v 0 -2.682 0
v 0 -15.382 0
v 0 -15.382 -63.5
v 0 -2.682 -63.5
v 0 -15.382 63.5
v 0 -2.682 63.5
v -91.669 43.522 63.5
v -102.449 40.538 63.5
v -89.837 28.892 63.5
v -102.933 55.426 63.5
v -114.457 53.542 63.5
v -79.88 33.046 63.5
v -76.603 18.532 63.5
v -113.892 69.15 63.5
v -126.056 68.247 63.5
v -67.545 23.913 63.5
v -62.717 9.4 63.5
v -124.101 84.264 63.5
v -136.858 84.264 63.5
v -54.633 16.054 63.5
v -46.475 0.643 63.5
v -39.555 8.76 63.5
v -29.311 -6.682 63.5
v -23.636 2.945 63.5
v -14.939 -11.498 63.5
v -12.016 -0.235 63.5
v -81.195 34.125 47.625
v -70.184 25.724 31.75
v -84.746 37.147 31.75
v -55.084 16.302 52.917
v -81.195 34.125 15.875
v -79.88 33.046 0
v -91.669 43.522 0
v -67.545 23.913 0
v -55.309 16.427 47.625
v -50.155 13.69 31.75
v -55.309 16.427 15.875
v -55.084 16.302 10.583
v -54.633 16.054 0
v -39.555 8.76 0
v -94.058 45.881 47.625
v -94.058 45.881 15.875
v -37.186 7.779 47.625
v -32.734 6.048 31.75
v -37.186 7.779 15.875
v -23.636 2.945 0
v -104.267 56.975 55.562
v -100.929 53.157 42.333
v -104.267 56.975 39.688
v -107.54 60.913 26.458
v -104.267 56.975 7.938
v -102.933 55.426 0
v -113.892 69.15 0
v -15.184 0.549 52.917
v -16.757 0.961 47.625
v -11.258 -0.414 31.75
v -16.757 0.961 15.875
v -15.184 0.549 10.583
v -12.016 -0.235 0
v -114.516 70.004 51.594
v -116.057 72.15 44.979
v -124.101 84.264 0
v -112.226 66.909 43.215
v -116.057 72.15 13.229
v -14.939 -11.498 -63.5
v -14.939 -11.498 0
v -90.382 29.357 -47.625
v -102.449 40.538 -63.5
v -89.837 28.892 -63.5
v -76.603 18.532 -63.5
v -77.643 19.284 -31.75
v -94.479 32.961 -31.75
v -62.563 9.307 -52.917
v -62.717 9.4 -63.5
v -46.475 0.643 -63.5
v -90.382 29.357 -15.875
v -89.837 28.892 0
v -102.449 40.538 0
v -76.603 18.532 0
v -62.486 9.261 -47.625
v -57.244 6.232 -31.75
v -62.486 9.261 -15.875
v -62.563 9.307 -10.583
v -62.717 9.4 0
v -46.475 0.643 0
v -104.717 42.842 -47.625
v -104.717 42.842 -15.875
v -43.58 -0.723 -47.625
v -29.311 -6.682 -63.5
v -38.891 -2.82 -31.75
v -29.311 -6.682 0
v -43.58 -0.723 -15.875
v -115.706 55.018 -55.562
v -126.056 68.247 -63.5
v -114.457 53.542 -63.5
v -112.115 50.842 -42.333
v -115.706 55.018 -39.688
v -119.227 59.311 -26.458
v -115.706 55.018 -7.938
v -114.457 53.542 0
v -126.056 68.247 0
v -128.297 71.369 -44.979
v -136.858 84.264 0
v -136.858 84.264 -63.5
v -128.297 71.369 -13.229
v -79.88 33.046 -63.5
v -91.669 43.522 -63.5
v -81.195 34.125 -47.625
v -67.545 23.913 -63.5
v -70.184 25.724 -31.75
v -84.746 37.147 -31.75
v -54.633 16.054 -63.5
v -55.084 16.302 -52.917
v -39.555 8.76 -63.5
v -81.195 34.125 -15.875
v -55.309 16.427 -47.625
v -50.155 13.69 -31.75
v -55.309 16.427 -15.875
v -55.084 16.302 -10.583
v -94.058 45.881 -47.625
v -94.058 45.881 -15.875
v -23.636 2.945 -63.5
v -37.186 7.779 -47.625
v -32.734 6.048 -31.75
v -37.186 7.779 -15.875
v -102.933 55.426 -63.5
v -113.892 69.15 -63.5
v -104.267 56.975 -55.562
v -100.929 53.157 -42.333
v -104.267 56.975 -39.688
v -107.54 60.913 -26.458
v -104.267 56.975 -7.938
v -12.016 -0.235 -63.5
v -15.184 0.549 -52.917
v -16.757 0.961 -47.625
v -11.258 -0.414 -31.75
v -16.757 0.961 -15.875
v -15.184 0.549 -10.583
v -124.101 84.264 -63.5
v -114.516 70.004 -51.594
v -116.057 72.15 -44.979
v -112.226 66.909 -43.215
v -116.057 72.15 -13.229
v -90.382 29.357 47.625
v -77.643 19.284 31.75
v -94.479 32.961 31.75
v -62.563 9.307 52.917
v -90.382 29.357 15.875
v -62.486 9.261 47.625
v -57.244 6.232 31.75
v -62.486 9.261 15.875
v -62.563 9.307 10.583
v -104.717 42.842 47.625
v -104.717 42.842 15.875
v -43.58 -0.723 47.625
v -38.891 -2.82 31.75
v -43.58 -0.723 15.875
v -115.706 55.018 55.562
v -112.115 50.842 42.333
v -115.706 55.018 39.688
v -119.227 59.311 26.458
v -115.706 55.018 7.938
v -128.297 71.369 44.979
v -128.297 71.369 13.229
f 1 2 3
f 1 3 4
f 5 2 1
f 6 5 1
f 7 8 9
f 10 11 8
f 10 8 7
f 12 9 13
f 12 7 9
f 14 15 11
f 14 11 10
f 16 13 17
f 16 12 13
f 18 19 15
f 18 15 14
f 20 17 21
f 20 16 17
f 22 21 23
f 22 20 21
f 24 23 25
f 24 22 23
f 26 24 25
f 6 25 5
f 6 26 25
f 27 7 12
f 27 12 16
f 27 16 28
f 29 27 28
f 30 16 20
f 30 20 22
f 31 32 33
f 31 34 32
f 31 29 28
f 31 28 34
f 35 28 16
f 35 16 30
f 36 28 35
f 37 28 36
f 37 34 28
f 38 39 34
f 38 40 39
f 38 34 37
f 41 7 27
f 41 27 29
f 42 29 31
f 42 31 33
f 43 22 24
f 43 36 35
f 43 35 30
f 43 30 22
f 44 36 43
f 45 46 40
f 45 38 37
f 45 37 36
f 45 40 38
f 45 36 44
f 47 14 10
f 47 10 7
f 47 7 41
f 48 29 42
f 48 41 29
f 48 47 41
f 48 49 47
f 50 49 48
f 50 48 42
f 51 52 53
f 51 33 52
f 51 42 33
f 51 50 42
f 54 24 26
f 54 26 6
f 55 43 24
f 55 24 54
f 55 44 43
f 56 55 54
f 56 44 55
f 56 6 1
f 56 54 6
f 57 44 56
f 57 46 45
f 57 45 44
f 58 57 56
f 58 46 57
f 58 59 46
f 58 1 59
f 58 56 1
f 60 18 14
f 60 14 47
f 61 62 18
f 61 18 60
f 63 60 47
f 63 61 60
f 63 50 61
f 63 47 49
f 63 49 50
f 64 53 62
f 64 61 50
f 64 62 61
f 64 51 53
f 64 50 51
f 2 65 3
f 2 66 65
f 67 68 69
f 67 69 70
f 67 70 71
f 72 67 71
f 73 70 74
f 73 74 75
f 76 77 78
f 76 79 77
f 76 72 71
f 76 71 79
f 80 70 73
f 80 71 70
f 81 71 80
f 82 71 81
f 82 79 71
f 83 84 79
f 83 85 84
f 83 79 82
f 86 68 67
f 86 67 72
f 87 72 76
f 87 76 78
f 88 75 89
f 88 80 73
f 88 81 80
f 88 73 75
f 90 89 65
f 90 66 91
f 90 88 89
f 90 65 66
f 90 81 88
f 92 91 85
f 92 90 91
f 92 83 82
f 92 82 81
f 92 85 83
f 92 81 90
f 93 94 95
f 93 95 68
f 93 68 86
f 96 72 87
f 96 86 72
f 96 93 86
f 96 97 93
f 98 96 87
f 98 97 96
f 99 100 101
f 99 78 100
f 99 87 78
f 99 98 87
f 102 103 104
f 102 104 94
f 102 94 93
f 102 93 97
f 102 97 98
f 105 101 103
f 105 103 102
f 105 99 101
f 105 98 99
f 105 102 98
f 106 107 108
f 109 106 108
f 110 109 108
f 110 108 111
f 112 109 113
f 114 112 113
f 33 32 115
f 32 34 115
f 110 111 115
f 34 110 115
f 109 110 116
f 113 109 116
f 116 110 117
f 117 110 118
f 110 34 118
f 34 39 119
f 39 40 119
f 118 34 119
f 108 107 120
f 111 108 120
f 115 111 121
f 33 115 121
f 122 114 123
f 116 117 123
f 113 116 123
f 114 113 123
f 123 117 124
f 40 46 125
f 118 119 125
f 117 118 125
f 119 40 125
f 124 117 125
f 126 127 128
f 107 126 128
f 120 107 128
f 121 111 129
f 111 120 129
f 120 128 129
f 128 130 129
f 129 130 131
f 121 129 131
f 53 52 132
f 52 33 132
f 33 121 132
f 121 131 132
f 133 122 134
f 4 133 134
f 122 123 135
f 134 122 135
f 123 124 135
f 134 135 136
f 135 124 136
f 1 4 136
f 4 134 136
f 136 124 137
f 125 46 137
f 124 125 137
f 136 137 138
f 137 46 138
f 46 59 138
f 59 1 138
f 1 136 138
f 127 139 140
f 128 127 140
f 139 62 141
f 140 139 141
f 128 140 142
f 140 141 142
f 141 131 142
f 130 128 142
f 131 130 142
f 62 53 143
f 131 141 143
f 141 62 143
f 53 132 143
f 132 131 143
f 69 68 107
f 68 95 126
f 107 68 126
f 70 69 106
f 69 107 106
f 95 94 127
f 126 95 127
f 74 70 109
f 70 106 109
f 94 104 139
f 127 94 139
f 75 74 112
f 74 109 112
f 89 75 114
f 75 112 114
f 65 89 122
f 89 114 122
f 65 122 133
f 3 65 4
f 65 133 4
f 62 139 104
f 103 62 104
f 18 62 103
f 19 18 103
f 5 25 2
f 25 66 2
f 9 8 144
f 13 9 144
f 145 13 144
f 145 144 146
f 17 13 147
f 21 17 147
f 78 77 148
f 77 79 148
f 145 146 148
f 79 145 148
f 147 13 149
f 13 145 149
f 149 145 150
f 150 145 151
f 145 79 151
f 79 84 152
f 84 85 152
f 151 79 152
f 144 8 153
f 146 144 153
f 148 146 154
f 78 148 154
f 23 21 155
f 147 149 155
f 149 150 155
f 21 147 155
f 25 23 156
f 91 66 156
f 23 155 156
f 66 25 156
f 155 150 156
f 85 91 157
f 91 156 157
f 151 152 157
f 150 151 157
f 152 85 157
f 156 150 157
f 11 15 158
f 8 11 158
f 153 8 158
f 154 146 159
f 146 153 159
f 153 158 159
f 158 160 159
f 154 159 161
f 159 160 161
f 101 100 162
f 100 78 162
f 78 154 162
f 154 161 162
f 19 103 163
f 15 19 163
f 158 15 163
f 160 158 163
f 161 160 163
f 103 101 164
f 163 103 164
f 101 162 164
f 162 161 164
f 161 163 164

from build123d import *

# Parameters (mm, degrees)
BOSS_EXTRUDE1_DEPTH = 63.5


with BuildPart() as part:
    # Sketch1 → Boss-Extrude1 (new, symmetric)
    with BuildSketch(Plane.XY):
        with BuildLine():
            Line((-124.10088452, 84.263750928), (-136.857511415, 84.263750928))
            add(Edge.make_bspline(
                [(-136.857511415, 84.263750928), (-86.857146787, 4.126444198), (0, -15.381825942)],
                knots=[0, 0, 0, 1, 1, 1], degree=2))
            Line((0, -15.381825942), (0, -2.681825942))
            add(Edge.make_bspline(
                [(-124.10088452, 84.263750928), (-78.316961973, 10.657955133), (0, -2.681825942)],
                knots=[0, 0, 0, 1, 1, 1], degree=2))
        make_face()
    extrude(amount=BOSS_EXTRUDE1_DEPTH, both=True)


solid = part.part
